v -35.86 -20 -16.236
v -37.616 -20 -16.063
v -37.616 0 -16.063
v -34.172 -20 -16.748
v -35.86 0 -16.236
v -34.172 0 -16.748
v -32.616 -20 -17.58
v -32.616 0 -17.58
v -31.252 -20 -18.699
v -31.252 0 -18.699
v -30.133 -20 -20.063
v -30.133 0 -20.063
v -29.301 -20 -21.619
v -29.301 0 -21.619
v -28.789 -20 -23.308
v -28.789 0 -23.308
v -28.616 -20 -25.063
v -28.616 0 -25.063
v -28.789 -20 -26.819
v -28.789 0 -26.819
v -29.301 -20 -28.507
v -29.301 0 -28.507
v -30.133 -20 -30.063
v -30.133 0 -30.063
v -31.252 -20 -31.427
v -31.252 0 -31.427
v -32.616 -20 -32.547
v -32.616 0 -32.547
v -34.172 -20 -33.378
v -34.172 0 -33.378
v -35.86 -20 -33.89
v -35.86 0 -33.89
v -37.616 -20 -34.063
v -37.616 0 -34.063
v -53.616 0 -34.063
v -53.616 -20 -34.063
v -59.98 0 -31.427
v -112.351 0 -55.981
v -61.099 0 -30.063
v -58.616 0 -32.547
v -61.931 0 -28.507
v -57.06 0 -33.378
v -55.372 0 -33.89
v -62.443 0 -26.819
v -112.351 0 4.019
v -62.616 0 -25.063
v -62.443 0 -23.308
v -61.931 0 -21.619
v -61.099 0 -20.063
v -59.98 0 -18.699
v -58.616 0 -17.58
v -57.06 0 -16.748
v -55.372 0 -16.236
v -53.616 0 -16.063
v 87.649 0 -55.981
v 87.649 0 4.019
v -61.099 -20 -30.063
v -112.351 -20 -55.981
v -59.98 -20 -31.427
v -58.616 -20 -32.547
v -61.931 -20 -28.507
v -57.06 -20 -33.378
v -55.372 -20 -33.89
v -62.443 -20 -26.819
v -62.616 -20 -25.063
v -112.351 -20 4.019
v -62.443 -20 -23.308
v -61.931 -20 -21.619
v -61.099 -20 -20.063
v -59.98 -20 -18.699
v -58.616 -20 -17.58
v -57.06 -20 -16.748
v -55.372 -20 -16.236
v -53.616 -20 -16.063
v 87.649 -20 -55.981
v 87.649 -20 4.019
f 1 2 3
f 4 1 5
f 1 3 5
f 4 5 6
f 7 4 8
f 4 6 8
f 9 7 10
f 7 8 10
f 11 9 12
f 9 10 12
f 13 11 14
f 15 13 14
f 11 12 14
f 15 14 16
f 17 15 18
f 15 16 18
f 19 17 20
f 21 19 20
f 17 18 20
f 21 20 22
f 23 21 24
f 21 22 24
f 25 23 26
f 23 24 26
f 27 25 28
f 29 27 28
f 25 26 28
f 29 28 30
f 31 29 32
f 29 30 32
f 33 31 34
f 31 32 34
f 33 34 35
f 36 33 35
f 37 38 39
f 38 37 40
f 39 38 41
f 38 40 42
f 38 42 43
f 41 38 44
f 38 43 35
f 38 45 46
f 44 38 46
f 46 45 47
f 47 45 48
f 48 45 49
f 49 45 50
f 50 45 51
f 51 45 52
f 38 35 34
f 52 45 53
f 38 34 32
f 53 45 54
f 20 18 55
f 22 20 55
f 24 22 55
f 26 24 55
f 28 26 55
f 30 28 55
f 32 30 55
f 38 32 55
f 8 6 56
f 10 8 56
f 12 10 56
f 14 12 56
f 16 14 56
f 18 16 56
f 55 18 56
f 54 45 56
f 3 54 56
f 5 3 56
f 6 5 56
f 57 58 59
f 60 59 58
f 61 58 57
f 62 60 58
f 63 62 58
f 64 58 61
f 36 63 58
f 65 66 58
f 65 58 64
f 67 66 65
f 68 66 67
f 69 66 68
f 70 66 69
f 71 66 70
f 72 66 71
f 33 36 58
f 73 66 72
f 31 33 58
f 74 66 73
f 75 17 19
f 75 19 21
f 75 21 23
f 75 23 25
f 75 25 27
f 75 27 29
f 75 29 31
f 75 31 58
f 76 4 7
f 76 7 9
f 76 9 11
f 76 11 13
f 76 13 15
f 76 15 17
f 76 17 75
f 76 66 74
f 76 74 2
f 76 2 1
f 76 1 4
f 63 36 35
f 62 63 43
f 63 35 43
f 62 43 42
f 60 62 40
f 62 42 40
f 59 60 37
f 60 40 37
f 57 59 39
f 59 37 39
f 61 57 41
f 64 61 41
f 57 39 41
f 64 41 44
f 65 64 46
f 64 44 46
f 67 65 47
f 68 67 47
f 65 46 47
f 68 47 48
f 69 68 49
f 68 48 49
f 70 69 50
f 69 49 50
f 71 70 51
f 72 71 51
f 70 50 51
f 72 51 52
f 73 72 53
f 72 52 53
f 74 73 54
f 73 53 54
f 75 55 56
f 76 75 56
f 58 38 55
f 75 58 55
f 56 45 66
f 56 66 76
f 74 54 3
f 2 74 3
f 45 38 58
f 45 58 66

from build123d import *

# Parameters (mm, degrees)
F0_W     = 200
F0_H     = 60
F1_DEPTH = 20


with BuildPart() as f1:
    # F0 (on Front) → F1 (new body)
    with BuildSketch(Plane.XZ):
        with Locations((-12.351252, -25.980778)):
            Rectangle(F0_W, F0_H)
        with BuildLine():
            Line((-53.61577, -16.063345), (-37.61577, -16.063345))
            ThreePointArc((-37.61577, -16.063345), (-28.61577, -25.063345), (-37.61577, -34.063345))
            Line((-37.61577, -34.063345), (-53.61577, -34.063345))
            ThreePointArc((-53.61577, -34.063345), (-62.61577, -25.063345), (-53.61577, -16.063345))
        make_face(mode=Mode.SUBTRACT)
    extrude(amount=F1_DEPTH)


solid = f1.part
